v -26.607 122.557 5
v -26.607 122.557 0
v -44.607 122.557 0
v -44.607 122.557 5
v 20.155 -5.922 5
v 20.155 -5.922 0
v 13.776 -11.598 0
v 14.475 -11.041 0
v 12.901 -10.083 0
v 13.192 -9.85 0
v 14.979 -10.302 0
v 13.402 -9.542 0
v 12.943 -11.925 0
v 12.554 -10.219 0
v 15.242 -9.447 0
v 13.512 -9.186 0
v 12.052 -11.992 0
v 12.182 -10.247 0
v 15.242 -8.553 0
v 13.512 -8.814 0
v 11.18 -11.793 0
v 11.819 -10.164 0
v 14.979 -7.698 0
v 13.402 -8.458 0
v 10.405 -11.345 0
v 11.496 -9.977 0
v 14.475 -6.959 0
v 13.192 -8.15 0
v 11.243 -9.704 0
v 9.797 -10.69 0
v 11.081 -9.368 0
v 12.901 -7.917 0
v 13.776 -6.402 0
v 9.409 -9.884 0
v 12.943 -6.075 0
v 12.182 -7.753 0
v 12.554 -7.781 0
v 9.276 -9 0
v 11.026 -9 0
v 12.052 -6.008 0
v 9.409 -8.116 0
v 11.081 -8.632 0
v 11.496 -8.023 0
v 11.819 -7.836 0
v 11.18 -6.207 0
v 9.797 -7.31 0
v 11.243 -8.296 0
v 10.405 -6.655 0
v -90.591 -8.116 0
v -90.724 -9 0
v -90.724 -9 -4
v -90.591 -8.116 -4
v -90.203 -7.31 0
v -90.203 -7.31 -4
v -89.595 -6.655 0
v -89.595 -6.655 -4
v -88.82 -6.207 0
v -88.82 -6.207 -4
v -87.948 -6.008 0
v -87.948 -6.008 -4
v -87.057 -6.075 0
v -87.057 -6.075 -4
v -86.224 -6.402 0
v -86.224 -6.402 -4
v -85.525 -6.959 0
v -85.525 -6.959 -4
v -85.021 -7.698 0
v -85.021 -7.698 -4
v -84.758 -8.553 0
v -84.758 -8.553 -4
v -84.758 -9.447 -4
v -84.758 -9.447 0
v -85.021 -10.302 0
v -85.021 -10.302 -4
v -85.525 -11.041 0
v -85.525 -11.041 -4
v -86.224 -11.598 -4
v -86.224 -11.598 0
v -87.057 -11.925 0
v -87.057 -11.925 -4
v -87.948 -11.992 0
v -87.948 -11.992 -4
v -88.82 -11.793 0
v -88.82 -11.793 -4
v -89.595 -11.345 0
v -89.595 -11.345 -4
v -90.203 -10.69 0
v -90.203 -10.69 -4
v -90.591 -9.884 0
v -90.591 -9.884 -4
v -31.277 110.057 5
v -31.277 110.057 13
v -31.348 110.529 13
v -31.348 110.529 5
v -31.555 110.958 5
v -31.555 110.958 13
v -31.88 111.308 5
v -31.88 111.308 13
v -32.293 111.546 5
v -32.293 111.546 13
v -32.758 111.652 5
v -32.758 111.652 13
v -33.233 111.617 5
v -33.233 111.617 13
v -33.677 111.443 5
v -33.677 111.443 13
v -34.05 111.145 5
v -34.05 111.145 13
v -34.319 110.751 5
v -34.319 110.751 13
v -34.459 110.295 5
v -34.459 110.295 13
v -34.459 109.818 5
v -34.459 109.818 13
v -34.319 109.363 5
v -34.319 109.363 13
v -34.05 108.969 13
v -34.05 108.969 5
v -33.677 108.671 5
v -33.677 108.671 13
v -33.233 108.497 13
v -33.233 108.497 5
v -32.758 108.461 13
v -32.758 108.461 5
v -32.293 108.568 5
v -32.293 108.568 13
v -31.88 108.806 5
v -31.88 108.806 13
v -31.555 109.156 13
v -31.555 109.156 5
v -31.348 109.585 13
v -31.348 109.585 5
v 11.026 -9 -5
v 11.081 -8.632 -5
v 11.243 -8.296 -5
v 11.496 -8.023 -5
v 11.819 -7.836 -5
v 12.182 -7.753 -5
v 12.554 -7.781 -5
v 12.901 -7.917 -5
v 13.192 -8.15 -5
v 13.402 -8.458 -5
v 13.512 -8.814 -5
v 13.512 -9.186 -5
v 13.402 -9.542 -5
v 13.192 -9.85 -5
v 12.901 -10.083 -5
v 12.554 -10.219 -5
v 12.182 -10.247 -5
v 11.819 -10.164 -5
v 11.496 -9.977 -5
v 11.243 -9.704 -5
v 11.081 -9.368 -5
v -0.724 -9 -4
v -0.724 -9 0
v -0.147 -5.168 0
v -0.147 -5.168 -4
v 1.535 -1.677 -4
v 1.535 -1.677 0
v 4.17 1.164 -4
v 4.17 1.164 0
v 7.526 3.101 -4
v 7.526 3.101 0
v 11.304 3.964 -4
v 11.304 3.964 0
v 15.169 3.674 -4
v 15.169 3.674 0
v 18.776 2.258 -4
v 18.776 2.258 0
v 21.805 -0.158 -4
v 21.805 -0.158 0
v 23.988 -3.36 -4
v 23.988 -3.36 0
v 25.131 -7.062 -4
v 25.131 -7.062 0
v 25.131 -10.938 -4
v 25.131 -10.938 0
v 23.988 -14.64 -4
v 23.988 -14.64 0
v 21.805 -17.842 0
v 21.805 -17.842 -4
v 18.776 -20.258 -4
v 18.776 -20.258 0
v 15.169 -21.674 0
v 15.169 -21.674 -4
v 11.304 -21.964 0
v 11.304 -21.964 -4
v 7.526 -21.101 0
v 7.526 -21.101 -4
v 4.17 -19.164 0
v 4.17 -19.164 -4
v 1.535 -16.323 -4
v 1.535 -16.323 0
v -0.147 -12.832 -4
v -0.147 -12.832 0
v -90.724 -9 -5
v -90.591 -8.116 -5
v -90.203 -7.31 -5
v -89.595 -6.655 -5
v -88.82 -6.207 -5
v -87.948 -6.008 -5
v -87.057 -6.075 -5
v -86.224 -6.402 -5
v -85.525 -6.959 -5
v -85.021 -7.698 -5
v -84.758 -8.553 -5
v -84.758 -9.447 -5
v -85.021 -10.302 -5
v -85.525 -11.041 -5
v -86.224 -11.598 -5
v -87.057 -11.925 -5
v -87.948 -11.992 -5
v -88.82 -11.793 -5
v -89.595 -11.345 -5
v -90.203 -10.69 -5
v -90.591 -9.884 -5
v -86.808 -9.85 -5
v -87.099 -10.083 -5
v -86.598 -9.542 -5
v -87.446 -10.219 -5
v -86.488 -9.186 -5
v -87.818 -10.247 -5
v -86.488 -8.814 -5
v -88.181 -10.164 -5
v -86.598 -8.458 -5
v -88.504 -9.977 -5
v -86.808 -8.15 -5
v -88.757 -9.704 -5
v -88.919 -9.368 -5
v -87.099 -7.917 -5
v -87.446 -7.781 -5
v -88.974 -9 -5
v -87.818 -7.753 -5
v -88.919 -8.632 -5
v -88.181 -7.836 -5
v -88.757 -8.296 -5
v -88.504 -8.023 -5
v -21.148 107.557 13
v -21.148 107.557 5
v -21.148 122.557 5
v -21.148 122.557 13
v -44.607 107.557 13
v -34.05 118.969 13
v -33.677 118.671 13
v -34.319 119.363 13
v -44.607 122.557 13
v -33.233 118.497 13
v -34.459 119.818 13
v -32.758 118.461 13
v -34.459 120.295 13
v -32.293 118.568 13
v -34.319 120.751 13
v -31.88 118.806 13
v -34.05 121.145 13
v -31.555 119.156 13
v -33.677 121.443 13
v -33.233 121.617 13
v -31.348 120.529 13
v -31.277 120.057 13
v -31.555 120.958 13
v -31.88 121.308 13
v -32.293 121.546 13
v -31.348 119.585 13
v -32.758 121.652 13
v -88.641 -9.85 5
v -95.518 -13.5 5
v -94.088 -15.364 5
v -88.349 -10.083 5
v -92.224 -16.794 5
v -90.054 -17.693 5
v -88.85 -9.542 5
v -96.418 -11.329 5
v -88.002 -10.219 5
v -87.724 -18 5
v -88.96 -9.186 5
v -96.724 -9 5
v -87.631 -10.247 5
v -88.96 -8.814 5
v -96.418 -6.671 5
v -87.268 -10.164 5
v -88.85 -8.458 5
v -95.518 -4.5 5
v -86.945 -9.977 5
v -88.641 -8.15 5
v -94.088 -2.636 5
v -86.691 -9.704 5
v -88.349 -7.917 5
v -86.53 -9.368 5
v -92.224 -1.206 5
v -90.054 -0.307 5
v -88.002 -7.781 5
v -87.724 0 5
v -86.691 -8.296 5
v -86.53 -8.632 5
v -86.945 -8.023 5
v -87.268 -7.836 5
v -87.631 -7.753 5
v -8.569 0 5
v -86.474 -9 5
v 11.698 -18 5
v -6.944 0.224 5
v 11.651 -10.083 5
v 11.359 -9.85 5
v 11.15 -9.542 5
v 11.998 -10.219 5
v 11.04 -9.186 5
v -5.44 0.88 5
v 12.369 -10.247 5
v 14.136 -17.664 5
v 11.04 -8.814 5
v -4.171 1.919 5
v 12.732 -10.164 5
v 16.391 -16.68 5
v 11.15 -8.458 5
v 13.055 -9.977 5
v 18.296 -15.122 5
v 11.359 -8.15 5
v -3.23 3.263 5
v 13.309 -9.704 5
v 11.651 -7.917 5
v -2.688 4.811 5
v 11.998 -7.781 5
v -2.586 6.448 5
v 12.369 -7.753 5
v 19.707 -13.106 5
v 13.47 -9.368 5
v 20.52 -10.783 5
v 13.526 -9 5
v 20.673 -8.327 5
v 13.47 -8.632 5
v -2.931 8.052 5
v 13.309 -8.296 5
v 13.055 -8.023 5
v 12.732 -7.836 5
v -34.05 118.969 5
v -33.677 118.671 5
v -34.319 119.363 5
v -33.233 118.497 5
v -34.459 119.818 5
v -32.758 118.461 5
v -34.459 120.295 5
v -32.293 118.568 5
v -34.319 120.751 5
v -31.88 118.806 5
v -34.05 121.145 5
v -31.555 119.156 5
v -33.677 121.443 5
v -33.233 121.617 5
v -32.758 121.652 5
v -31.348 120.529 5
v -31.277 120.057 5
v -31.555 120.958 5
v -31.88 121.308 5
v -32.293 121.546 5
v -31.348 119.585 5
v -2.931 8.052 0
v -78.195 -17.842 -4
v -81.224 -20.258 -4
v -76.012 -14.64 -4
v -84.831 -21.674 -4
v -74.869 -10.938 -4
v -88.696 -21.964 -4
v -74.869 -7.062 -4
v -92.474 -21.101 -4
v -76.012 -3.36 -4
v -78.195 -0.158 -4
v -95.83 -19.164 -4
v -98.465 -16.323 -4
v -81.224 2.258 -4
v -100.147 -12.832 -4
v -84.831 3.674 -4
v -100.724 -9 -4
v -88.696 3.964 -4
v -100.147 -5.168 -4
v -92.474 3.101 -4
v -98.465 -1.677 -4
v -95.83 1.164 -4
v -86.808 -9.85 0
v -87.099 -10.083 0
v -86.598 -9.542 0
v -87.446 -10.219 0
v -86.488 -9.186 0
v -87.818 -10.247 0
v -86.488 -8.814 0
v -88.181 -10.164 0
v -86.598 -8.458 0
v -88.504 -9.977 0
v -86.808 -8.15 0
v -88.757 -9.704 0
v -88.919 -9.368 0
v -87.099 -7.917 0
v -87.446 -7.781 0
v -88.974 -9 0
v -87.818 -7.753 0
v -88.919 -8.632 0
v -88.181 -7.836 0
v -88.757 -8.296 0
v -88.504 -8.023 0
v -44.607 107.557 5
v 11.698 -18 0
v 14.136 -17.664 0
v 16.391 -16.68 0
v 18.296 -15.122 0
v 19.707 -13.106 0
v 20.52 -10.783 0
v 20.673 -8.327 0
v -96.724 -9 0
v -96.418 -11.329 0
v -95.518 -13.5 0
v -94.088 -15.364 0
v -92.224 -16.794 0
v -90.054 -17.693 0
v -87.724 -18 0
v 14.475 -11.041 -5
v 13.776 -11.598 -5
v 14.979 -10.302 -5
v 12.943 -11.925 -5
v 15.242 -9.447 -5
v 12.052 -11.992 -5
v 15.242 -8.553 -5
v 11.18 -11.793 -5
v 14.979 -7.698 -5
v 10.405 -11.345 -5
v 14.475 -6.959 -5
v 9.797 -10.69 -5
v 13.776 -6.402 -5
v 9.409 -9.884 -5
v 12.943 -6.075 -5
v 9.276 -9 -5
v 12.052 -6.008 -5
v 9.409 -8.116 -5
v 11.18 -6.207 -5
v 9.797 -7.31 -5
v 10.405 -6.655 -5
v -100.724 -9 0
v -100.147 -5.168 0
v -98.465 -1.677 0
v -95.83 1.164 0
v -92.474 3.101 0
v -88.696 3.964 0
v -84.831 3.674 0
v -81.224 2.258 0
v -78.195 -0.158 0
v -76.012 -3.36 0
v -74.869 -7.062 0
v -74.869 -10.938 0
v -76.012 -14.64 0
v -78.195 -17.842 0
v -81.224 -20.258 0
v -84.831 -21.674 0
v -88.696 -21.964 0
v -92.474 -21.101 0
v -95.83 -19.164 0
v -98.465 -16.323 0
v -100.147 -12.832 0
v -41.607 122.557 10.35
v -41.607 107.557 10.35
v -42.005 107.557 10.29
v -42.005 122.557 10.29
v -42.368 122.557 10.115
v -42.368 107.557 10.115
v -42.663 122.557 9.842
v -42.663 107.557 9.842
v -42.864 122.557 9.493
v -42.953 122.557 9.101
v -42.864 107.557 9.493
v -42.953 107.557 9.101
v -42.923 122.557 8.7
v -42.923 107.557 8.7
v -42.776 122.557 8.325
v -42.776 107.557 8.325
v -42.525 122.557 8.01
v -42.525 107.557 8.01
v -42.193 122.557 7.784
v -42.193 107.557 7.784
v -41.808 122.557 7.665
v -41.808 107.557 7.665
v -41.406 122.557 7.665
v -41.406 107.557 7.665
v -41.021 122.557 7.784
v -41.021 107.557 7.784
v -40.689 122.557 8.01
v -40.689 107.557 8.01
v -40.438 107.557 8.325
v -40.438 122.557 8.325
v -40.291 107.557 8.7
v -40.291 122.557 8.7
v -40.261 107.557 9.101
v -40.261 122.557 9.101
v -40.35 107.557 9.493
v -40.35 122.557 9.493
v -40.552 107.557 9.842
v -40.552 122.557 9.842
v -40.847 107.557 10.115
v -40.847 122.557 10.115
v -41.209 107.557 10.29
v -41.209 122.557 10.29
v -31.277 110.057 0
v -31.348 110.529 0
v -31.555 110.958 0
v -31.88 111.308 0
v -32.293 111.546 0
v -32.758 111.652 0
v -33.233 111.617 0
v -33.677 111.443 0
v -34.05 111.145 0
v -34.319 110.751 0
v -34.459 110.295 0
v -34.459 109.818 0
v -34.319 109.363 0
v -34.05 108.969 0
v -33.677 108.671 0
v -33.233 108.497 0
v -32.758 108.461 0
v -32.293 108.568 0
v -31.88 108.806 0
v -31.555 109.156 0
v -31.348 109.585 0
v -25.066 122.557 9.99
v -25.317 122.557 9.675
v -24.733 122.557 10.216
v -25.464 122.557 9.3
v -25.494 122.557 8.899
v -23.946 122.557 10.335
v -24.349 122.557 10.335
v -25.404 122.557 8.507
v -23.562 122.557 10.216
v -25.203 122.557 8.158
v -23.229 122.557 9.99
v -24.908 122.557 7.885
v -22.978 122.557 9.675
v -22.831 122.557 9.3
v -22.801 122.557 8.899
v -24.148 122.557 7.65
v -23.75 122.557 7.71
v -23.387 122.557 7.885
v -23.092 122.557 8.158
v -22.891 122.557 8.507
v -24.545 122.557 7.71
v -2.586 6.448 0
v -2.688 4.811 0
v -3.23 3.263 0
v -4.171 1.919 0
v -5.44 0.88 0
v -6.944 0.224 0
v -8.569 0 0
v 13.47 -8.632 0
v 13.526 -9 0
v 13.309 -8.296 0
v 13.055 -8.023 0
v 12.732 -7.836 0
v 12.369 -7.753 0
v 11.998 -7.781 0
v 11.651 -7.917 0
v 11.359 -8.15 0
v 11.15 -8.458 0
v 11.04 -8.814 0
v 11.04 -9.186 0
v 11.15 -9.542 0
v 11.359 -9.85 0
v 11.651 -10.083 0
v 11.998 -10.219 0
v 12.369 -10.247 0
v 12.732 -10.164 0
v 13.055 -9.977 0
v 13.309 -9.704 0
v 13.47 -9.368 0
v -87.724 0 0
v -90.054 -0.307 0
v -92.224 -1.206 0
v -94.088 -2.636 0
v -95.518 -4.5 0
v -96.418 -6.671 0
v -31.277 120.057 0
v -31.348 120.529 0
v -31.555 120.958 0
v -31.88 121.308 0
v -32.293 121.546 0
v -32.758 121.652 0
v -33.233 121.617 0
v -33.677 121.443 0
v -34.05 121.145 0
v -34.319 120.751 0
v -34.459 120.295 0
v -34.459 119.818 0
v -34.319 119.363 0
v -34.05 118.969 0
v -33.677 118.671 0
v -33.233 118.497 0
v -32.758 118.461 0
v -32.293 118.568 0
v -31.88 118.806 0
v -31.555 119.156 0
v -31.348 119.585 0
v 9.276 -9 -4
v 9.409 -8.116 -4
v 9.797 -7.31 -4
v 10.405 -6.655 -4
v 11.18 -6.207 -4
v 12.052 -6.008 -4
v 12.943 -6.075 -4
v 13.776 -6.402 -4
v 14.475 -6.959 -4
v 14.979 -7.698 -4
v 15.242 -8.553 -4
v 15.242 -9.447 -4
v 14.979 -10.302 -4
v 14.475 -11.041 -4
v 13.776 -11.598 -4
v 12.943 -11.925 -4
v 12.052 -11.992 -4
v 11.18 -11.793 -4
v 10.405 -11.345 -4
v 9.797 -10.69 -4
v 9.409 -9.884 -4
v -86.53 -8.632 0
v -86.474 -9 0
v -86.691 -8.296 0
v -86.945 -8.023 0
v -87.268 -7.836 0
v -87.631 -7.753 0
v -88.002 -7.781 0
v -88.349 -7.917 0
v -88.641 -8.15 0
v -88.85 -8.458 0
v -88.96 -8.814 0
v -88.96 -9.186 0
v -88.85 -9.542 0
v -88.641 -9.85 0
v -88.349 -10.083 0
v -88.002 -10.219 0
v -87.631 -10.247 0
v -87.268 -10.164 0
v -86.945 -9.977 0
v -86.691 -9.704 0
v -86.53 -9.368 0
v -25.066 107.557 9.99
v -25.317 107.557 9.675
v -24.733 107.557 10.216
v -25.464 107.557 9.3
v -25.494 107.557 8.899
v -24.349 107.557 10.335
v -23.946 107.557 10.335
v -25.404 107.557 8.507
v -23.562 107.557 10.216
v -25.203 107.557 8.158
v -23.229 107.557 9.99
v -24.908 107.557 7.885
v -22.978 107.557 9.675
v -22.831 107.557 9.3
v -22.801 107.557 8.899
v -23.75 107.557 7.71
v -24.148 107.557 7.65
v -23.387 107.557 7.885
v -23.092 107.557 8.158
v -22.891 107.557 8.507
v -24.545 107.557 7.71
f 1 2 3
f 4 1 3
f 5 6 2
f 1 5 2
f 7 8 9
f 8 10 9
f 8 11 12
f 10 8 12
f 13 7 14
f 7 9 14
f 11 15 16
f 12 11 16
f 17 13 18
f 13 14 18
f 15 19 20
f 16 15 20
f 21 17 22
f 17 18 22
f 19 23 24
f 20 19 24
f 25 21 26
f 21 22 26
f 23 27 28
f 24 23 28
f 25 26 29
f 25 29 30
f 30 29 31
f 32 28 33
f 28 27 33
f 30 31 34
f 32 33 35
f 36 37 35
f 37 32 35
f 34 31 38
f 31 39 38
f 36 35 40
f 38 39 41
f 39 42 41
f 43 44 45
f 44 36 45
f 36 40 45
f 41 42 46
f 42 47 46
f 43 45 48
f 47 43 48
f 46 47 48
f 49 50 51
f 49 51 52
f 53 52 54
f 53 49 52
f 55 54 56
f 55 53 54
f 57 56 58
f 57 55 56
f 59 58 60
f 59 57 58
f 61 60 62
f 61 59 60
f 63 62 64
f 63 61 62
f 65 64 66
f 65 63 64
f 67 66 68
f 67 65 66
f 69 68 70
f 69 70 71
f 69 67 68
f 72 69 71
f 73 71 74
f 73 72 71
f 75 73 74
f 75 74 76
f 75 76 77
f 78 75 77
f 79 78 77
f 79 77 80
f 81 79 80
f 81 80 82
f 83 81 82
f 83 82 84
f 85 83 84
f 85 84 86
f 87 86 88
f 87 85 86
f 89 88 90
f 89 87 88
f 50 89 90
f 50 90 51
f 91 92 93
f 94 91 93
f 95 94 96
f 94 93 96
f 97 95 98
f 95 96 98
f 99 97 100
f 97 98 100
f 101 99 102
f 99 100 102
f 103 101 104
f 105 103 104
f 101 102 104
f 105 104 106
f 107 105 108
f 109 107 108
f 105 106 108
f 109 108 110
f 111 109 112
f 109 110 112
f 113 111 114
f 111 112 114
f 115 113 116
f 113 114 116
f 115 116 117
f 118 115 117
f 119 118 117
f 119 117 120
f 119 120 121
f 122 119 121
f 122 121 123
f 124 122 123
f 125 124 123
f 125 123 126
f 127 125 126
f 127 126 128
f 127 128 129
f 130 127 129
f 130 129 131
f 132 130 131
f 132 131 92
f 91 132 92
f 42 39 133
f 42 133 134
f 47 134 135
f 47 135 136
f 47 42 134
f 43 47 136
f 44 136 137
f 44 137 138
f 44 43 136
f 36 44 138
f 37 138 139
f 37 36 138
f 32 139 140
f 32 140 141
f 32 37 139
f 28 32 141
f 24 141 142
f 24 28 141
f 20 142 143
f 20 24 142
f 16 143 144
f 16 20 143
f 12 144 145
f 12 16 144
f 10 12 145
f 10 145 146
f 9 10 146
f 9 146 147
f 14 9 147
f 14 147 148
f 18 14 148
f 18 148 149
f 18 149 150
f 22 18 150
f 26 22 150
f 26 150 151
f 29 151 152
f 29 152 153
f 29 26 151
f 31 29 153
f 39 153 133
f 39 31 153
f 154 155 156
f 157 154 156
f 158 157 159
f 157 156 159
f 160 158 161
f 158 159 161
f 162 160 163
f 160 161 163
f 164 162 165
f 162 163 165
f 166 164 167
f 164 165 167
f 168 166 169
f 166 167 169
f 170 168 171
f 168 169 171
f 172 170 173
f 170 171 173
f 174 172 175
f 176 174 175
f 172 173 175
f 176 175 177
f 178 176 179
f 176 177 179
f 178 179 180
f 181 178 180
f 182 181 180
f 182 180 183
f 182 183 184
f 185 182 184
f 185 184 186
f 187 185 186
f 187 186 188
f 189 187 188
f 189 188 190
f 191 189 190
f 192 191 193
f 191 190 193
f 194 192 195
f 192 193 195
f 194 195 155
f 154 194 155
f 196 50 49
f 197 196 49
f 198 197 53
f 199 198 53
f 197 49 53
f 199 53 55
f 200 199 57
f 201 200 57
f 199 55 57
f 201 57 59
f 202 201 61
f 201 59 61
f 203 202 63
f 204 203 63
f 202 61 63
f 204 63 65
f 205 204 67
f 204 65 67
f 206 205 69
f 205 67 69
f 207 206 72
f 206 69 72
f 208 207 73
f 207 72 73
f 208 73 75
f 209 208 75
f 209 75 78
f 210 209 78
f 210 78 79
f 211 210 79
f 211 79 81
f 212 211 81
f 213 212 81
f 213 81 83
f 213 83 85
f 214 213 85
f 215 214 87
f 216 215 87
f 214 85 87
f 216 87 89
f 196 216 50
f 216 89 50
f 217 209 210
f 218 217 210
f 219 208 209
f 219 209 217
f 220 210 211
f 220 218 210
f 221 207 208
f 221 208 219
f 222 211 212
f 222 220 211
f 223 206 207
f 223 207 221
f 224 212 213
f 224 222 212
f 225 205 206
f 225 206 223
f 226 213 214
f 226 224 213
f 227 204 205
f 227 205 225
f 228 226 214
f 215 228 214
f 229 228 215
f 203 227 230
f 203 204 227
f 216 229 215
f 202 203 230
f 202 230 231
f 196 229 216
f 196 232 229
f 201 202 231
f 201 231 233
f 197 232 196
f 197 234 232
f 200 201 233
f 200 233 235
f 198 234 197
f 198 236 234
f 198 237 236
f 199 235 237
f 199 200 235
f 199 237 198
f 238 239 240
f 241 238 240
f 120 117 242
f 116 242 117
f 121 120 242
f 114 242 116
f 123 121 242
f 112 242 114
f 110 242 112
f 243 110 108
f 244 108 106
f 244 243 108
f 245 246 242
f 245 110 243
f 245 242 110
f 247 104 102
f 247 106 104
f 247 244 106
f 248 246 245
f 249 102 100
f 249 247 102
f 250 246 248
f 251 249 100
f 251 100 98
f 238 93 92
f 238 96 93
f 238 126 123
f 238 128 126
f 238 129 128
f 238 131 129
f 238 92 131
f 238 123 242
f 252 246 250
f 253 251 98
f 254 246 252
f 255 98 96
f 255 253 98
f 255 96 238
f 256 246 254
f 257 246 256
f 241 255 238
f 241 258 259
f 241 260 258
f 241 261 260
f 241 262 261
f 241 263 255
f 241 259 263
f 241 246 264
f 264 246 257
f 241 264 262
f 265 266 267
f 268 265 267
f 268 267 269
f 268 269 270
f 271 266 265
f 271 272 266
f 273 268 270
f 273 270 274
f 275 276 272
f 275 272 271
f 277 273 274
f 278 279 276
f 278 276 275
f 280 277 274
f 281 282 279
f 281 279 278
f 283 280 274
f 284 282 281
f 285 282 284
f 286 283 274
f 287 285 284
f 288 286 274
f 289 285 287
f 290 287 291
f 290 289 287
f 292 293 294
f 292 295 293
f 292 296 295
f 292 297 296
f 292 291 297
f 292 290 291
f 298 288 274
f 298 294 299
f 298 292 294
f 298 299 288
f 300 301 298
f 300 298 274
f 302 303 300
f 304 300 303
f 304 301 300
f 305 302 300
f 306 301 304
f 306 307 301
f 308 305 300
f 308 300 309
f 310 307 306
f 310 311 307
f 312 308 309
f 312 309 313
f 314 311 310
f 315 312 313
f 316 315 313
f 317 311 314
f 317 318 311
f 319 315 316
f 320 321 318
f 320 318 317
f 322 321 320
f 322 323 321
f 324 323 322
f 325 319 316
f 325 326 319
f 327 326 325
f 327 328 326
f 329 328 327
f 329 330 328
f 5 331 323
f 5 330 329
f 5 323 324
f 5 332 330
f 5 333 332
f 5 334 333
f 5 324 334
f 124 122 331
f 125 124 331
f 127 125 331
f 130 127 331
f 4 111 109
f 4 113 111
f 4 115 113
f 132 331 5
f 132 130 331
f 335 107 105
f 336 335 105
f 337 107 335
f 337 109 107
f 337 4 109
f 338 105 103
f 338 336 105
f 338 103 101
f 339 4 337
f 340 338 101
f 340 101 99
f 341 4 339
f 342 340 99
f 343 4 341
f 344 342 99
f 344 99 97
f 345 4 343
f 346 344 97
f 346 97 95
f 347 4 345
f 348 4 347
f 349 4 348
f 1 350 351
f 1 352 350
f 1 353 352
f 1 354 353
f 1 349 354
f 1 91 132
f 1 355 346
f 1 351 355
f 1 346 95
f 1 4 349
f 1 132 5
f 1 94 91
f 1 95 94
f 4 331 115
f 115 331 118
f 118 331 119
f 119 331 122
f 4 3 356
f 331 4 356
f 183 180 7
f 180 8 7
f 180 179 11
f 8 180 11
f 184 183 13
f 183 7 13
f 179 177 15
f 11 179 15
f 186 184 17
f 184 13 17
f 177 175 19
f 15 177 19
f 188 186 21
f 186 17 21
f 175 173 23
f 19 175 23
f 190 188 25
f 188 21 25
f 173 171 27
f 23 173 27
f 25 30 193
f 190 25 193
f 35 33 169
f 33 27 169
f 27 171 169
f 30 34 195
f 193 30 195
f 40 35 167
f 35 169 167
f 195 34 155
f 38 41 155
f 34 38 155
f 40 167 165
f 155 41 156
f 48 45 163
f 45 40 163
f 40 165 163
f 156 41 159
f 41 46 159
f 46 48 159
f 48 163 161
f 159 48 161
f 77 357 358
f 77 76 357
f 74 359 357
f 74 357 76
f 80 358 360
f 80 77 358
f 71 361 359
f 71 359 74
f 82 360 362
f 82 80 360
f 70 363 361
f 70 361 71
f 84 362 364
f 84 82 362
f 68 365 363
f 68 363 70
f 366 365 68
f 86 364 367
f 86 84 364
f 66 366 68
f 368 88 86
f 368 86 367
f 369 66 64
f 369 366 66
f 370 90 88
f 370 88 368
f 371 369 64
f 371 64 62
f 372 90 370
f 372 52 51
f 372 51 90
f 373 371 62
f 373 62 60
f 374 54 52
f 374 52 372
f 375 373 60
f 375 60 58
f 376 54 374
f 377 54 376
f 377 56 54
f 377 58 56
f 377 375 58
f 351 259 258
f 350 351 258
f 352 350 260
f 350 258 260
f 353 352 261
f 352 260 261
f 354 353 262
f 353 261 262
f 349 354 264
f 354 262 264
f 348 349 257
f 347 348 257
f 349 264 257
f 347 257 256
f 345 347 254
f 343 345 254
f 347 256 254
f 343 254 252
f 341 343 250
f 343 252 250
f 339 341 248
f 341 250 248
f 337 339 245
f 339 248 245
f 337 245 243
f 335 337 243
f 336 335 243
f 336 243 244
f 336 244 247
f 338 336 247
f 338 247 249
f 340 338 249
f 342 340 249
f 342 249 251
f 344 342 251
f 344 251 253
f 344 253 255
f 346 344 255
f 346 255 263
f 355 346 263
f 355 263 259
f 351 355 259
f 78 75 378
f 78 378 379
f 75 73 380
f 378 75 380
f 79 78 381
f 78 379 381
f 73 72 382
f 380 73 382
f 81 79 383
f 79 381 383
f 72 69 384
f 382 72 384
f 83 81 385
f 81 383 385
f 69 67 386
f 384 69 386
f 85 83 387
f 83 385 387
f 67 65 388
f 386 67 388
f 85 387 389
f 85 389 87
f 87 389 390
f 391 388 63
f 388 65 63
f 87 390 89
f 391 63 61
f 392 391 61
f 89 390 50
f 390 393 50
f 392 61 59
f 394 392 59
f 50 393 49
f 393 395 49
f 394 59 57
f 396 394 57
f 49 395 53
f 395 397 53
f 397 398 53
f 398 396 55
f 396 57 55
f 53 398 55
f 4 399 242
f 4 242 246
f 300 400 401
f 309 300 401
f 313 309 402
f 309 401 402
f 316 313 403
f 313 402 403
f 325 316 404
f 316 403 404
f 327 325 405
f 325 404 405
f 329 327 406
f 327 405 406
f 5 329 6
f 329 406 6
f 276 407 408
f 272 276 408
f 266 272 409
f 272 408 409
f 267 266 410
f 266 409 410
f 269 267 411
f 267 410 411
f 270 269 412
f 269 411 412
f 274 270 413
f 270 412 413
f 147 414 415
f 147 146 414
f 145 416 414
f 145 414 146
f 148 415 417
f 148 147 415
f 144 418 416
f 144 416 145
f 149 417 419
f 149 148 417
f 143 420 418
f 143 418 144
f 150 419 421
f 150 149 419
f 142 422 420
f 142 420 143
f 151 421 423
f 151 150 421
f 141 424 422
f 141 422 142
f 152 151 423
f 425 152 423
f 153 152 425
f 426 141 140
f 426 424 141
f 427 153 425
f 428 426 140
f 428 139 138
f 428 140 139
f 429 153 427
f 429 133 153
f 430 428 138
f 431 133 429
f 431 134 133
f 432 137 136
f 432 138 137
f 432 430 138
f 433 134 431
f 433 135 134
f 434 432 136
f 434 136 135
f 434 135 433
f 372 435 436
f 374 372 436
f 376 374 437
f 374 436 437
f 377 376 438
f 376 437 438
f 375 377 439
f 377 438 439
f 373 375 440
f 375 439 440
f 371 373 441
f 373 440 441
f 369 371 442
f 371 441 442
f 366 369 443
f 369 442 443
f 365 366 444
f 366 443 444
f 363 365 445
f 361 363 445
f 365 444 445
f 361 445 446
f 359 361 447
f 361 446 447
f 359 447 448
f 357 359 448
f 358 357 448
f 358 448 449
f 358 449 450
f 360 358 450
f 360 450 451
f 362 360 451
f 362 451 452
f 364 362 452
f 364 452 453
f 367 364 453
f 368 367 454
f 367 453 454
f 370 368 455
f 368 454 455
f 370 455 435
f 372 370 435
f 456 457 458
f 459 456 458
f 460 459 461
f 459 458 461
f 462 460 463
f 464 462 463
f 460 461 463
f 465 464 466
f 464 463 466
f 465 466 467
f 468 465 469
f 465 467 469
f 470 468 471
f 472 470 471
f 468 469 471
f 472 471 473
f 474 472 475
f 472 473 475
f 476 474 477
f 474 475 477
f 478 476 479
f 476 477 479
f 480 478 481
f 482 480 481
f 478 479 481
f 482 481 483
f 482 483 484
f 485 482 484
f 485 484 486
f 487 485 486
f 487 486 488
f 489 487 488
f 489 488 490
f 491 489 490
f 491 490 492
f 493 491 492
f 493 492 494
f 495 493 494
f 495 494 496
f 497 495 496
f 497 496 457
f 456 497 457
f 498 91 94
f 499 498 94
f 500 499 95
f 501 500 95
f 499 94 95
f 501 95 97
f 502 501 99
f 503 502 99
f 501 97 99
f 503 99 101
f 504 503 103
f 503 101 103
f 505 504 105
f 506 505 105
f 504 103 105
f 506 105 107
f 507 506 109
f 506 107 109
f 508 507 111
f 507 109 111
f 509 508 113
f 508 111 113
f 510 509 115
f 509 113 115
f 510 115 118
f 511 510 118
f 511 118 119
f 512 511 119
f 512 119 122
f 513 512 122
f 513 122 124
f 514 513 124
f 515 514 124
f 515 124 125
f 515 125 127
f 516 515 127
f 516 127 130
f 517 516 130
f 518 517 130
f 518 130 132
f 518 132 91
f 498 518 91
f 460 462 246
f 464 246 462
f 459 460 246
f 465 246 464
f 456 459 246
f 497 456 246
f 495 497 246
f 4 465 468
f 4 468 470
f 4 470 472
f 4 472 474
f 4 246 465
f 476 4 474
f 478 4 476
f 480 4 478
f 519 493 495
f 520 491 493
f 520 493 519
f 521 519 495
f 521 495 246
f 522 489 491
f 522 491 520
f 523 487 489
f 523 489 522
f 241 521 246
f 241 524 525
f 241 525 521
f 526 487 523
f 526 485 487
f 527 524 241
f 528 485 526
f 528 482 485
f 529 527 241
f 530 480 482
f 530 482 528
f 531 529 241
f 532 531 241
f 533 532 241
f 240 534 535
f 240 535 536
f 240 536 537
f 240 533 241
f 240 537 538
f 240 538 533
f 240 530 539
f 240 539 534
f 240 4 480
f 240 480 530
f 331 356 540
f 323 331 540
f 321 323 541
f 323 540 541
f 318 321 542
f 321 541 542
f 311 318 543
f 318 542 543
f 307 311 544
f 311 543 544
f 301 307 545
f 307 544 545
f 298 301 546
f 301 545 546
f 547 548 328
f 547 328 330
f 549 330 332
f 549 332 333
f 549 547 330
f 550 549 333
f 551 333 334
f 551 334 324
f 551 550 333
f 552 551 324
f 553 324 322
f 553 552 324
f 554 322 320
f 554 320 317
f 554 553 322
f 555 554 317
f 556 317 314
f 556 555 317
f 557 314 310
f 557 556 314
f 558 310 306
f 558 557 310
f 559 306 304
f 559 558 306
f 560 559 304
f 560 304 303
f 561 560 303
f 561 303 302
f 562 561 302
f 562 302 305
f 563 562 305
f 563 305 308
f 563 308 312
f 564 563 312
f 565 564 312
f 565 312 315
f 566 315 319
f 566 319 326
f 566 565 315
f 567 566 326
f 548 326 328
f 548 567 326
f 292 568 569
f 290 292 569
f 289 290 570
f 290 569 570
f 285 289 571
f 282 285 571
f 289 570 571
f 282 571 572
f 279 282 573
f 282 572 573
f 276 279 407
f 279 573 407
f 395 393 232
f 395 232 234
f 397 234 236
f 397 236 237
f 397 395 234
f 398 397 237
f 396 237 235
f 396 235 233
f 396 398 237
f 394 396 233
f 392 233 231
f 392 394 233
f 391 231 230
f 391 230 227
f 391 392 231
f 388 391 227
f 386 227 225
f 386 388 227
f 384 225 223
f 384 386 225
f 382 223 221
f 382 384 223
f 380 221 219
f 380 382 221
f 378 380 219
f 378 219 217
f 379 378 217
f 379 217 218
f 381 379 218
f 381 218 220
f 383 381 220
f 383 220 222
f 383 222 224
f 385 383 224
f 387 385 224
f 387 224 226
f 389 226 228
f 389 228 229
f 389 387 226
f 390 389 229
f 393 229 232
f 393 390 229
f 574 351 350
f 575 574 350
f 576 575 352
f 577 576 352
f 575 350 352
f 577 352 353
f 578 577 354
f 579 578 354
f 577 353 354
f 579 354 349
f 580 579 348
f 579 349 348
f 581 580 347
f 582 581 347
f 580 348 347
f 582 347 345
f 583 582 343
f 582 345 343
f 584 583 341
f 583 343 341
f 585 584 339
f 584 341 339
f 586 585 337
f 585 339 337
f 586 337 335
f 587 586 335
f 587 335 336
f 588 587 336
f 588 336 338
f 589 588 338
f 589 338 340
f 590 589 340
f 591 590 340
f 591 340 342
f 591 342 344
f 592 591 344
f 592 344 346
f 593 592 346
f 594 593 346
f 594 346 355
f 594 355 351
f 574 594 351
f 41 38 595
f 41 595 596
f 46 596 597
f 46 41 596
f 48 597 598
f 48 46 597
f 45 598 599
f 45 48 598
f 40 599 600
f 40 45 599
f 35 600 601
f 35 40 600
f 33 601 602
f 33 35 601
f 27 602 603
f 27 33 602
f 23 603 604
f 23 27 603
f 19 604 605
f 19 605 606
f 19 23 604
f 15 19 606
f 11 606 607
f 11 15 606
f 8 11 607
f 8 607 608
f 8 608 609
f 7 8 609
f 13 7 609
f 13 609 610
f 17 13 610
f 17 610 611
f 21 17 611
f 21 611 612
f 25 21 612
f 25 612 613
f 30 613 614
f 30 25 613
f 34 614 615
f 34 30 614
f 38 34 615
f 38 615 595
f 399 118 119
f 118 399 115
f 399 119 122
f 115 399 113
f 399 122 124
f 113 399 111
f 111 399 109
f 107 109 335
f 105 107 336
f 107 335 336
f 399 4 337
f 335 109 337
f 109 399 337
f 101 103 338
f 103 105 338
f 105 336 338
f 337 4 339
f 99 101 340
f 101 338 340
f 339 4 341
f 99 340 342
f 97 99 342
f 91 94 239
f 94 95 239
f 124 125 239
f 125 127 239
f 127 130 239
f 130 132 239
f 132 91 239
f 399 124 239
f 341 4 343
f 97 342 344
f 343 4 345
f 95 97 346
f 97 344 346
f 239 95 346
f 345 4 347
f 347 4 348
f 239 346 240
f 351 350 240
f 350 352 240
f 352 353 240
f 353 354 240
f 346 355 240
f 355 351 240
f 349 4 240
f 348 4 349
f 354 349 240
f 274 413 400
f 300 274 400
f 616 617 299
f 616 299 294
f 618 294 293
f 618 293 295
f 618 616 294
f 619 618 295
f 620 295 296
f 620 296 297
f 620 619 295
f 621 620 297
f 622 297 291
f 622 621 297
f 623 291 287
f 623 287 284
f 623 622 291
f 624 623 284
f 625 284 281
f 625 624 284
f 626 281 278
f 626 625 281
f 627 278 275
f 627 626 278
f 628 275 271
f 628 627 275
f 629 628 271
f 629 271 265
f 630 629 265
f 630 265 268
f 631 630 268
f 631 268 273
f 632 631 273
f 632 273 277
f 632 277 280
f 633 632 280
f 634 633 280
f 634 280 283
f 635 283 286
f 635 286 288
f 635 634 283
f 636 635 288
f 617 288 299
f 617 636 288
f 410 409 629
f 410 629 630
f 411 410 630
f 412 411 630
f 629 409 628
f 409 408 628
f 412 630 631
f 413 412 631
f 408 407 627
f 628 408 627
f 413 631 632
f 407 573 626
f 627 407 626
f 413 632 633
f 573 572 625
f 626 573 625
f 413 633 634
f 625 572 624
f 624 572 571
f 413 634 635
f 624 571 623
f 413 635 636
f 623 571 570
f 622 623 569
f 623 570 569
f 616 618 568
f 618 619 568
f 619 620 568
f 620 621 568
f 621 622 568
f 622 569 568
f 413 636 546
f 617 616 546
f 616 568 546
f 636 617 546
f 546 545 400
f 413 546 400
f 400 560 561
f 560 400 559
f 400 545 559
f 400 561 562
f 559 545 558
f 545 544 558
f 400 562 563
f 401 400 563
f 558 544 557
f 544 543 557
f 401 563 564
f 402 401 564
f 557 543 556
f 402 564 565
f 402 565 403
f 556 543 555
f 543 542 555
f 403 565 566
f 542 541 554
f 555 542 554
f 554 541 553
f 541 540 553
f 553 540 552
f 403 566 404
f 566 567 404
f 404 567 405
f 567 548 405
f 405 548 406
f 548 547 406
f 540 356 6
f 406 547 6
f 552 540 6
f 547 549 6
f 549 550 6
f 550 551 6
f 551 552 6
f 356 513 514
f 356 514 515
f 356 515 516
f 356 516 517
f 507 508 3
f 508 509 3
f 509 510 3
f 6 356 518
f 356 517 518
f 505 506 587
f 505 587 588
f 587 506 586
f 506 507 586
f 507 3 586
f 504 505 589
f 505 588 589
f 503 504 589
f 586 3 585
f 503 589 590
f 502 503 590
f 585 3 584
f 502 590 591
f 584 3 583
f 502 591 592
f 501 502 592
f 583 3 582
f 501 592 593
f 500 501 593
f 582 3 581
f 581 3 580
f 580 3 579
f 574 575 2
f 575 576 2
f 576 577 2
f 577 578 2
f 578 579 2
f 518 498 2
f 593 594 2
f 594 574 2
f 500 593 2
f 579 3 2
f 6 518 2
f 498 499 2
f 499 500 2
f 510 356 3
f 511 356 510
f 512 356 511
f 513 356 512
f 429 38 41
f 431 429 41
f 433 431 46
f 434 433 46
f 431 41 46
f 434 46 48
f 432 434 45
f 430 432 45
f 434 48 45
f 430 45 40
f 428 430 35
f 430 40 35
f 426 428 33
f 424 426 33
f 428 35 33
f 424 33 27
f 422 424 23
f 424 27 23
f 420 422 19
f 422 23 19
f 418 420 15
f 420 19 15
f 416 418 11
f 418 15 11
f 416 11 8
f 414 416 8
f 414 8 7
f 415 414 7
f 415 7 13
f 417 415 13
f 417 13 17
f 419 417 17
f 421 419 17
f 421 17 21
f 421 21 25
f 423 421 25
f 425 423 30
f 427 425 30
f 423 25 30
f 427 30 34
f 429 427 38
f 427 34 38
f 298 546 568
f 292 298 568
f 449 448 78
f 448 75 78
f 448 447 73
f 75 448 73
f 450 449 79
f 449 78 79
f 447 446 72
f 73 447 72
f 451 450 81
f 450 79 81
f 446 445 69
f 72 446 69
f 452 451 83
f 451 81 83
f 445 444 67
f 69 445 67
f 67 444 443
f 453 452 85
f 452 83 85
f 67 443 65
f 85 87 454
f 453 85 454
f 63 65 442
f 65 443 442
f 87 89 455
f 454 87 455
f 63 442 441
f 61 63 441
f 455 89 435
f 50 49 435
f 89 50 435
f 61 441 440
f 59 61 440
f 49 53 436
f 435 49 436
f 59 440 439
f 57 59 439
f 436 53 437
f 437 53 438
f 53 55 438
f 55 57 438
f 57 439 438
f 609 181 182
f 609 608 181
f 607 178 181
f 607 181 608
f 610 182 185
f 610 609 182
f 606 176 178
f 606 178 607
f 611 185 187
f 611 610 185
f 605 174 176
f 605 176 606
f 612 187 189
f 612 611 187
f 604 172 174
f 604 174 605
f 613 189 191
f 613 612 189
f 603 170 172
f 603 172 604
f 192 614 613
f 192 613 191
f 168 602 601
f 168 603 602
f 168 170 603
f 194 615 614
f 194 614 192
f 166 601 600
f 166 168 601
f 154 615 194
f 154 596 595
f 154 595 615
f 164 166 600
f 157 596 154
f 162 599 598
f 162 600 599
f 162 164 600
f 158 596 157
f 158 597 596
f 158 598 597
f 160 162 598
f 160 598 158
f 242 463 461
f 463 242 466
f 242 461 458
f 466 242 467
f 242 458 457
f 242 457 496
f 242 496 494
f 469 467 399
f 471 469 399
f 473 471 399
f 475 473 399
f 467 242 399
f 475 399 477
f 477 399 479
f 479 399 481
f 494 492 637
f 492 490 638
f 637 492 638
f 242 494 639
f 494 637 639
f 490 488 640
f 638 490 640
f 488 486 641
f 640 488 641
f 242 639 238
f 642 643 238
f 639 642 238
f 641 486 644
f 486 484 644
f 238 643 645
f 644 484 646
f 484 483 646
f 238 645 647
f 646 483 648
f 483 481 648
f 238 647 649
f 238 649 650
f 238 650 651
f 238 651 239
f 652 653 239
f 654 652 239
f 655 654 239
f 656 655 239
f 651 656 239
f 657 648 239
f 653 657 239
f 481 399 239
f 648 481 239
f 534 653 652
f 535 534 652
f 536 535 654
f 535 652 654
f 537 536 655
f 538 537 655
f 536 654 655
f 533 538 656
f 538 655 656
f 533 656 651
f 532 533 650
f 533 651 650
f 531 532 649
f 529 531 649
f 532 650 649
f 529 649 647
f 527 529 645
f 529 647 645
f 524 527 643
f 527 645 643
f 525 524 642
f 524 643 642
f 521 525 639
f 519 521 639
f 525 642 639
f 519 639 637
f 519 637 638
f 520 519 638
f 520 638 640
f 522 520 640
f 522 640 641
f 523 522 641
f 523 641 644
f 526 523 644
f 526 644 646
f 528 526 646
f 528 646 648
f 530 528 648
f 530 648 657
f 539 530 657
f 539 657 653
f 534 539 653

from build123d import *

# Parameters (mm, degrees)
SKETCH_1_R          = 1.25
EXTRUDE_1_DEPTH     = 5
SKETCH_2_W          = 23.459553514
SKETCH_2_H          = 15
EXTRUDE_2_DEPTH     = 8
SKETCH_3_R          = 1.6
CUT_EXTRUDE_1_DEPTH = 157.667782704
SKETCH_4_R          = 1.35
CUT_EXTRUDE_2_DEPTH = 160.025582655
SKETCH_6_R          = 3
SKETCH_6_R_2        = 1.25
EXTRUDE_3_DEPTH     = 5
EXTRUDE_3_2_DEPTH   = 5
SKETCH_7_R          = 13
SKETCH_7_R_2        = 3
EXTRUDE_4_DEPTH     = 4
EXTRUDE_4_2_DEPTH   = 4


with BuildPart() as part:
    # ｽｹｯﾁ1 → ﾎﾞｽ - 押し出し1 (new body)
    with BuildSketch(Plane.XY):
        with BuildLine():
            Line((-44.607087957, 122.55696691), (-2.930732316, 8.05212086))
            ThreePointArc((-2.930732316, 8.05212086), (-3.653975775, 2.558541382), (-8.56888804, 0))
            Line((-8.56888804, 0), (-87.724267892, 0))
            ThreePointArc((-87.724267892, 0), (-94.088228922, -2.636038969), (-96.724267892, -9))
            ThreePointArc((-96.724267892, -9), (-94.088228922, -15.363961031), (-87.724267892, -18))
            Line((-87.724267892, -18), (11.698132156, -18))
            ThreePointArc((11.698132156, -18), (19.070500555, -14.162187927), (20.155365743, -5.92181871))
            Line((20.155365743, -5.92181871), (-26.607087957, 122.55696691))
            Line((-26.607087957, 122.55696691), (-44.607087957, 122.55696691))
        make_face()
        with Locations((12.275732108, -9)):
            Circle(SKETCH_1_R, mode=Mode.SUBTRACT)
        with Locations((-87.724267892, -9)):
            Circle(SKETCH_1_R, mode=Mode.SUBTRACT)
    extrude(amount=EXTRUDE_1_DEPTH)


with BuildPart() as body_2:
    # ｽｹｯﾁ2 → ﾎﾞｽ - 押し出し2 (new body)
    with BuildSketch(Plane.XY.offset(5)):
        with Locations((-32.8773112, 115.05696691)):
            Rectangle(SKETCH_2_W, SKETCH_2_H)
    extrude(amount=EXTRUDE_2_DEPTH)


with BuildPart() as cut_extrude_1_tool:
    # ｽｹｯﾁ3 → ｶｯﾄ - 押し出し1 (new, through all)
    with BuildSketch(Plane.XY.offset(13)):
        with Locations((-32.8773112, 120.05696691)):
            Circle(SKETCH_3_R)
        with Locations((-32.8773112, 110.05696691)):
            Circle(SKETCH_3_R)
    extrude(amount=-CUT_EXTRUDE_1_DEPTH)


with BuildPart() as part_1:
    add(part.part)

    # ｶｯﾄ - 押し出し1: cut by cut_extrude_1_tool
    add(cut_extrude_1_tool.part, mode=Mode.SUBTRACT)


with BuildPart() as body_2_1:
    add(body_2.part)

    # ｶｯﾄ - 押し出し1: cut by cut_extrude_1_tool
    add(cut_extrude_1_tool.part, mode=Mode.SUBTRACT)

    # ｽｹｯﾁ4 → ｶｯﾄ - 押し出し2 (cut, through all)
    with BuildSketch(Plane.XZ.offset(-107.55696691)):
        with Locations(Location((-24.147534443, 9, 0), (0, 0, 270))):
            Circle(SKETCH_4_R)
        with Locations(Location((-41.607087957, 9, 0), (0, 0, 90))):
            Circle(SKETCH_4_R)
    extrude(amount=-CUT_EXTRUDE_2_DEPTH, mode=Mode.SUBTRACT)


with BuildPart() as body_3:
    # ｽｹｯﾁ6 → ﾎﾞｽ - 押し出し3 (new body)
    with BuildSketch(Plane(origin=(0, 0, 0), x_dir=(-1, 0, 0), z_dir=(0, 0, -1))):
        with Locations((-12.275732108, -9)):
            Circle(SKETCH_6_R)
        with Locations((-12.275732108, -9)):
            Circle(SKETCH_6_R_2, mode=Mode.SUBTRACT)
    extrude(amount=EXTRUDE_3_DEPTH)


with BuildPart() as body_4:
    # ｽｹｯﾁ6 → Extrude 3 2 (new body)
    with BuildSketch(Plane(origin=(0, 0, 0), x_dir=(-1, 0, 0), z_dir=(0, 0, -1))):
        with Locations((87.724267892, -9)):
            Circle(SKETCH_6_R)
        with Locations((87.724267892, -9)):
            Circle(SKETCH_6_R_2, mode=Mode.SUBTRACT)
    extrude(amount=EXTRUDE_3_2_DEPTH)


with BuildPart() as body_5:
    # ｽｹｯﾁ7 → ﾎﾞｽ - 押し出し4 (new body)
    with BuildSketch(Plane(origin=(0, 0, 0), x_dir=(-1, 0, 0), z_dir=(0, 0, -1))):
        with Locations((-12.275732108, -9)):
            Circle(SKETCH_7_R)
        with Locations((-12.275732108, -9)):
            Circle(SKETCH_7_R_2, mode=Mode.SUBTRACT)
    extrude(amount=EXTRUDE_4_DEPTH)


with BuildPart() as body_6:
    # ｽｹｯﾁ7 → Extrude 4 2 (new body)
    with BuildSketch(Plane(origin=(0, 0, 0), x_dir=(-1, 0, 0), z_dir=(0, 0, -1))):
        with Locations((87.724267892, -9)):
            Circle(SKETCH_7_R)
        with Locations((87.724267892, -9)):
            Circle(SKETCH_7_R_2, mode=Mode.SUBTRACT)
    extrude(amount=EXTRUDE_4_2_DEPTH)


solid = Compound([part_1.part, body_2_1.part, body_3.part, body_4.part, body_5.part, body_6.part])
